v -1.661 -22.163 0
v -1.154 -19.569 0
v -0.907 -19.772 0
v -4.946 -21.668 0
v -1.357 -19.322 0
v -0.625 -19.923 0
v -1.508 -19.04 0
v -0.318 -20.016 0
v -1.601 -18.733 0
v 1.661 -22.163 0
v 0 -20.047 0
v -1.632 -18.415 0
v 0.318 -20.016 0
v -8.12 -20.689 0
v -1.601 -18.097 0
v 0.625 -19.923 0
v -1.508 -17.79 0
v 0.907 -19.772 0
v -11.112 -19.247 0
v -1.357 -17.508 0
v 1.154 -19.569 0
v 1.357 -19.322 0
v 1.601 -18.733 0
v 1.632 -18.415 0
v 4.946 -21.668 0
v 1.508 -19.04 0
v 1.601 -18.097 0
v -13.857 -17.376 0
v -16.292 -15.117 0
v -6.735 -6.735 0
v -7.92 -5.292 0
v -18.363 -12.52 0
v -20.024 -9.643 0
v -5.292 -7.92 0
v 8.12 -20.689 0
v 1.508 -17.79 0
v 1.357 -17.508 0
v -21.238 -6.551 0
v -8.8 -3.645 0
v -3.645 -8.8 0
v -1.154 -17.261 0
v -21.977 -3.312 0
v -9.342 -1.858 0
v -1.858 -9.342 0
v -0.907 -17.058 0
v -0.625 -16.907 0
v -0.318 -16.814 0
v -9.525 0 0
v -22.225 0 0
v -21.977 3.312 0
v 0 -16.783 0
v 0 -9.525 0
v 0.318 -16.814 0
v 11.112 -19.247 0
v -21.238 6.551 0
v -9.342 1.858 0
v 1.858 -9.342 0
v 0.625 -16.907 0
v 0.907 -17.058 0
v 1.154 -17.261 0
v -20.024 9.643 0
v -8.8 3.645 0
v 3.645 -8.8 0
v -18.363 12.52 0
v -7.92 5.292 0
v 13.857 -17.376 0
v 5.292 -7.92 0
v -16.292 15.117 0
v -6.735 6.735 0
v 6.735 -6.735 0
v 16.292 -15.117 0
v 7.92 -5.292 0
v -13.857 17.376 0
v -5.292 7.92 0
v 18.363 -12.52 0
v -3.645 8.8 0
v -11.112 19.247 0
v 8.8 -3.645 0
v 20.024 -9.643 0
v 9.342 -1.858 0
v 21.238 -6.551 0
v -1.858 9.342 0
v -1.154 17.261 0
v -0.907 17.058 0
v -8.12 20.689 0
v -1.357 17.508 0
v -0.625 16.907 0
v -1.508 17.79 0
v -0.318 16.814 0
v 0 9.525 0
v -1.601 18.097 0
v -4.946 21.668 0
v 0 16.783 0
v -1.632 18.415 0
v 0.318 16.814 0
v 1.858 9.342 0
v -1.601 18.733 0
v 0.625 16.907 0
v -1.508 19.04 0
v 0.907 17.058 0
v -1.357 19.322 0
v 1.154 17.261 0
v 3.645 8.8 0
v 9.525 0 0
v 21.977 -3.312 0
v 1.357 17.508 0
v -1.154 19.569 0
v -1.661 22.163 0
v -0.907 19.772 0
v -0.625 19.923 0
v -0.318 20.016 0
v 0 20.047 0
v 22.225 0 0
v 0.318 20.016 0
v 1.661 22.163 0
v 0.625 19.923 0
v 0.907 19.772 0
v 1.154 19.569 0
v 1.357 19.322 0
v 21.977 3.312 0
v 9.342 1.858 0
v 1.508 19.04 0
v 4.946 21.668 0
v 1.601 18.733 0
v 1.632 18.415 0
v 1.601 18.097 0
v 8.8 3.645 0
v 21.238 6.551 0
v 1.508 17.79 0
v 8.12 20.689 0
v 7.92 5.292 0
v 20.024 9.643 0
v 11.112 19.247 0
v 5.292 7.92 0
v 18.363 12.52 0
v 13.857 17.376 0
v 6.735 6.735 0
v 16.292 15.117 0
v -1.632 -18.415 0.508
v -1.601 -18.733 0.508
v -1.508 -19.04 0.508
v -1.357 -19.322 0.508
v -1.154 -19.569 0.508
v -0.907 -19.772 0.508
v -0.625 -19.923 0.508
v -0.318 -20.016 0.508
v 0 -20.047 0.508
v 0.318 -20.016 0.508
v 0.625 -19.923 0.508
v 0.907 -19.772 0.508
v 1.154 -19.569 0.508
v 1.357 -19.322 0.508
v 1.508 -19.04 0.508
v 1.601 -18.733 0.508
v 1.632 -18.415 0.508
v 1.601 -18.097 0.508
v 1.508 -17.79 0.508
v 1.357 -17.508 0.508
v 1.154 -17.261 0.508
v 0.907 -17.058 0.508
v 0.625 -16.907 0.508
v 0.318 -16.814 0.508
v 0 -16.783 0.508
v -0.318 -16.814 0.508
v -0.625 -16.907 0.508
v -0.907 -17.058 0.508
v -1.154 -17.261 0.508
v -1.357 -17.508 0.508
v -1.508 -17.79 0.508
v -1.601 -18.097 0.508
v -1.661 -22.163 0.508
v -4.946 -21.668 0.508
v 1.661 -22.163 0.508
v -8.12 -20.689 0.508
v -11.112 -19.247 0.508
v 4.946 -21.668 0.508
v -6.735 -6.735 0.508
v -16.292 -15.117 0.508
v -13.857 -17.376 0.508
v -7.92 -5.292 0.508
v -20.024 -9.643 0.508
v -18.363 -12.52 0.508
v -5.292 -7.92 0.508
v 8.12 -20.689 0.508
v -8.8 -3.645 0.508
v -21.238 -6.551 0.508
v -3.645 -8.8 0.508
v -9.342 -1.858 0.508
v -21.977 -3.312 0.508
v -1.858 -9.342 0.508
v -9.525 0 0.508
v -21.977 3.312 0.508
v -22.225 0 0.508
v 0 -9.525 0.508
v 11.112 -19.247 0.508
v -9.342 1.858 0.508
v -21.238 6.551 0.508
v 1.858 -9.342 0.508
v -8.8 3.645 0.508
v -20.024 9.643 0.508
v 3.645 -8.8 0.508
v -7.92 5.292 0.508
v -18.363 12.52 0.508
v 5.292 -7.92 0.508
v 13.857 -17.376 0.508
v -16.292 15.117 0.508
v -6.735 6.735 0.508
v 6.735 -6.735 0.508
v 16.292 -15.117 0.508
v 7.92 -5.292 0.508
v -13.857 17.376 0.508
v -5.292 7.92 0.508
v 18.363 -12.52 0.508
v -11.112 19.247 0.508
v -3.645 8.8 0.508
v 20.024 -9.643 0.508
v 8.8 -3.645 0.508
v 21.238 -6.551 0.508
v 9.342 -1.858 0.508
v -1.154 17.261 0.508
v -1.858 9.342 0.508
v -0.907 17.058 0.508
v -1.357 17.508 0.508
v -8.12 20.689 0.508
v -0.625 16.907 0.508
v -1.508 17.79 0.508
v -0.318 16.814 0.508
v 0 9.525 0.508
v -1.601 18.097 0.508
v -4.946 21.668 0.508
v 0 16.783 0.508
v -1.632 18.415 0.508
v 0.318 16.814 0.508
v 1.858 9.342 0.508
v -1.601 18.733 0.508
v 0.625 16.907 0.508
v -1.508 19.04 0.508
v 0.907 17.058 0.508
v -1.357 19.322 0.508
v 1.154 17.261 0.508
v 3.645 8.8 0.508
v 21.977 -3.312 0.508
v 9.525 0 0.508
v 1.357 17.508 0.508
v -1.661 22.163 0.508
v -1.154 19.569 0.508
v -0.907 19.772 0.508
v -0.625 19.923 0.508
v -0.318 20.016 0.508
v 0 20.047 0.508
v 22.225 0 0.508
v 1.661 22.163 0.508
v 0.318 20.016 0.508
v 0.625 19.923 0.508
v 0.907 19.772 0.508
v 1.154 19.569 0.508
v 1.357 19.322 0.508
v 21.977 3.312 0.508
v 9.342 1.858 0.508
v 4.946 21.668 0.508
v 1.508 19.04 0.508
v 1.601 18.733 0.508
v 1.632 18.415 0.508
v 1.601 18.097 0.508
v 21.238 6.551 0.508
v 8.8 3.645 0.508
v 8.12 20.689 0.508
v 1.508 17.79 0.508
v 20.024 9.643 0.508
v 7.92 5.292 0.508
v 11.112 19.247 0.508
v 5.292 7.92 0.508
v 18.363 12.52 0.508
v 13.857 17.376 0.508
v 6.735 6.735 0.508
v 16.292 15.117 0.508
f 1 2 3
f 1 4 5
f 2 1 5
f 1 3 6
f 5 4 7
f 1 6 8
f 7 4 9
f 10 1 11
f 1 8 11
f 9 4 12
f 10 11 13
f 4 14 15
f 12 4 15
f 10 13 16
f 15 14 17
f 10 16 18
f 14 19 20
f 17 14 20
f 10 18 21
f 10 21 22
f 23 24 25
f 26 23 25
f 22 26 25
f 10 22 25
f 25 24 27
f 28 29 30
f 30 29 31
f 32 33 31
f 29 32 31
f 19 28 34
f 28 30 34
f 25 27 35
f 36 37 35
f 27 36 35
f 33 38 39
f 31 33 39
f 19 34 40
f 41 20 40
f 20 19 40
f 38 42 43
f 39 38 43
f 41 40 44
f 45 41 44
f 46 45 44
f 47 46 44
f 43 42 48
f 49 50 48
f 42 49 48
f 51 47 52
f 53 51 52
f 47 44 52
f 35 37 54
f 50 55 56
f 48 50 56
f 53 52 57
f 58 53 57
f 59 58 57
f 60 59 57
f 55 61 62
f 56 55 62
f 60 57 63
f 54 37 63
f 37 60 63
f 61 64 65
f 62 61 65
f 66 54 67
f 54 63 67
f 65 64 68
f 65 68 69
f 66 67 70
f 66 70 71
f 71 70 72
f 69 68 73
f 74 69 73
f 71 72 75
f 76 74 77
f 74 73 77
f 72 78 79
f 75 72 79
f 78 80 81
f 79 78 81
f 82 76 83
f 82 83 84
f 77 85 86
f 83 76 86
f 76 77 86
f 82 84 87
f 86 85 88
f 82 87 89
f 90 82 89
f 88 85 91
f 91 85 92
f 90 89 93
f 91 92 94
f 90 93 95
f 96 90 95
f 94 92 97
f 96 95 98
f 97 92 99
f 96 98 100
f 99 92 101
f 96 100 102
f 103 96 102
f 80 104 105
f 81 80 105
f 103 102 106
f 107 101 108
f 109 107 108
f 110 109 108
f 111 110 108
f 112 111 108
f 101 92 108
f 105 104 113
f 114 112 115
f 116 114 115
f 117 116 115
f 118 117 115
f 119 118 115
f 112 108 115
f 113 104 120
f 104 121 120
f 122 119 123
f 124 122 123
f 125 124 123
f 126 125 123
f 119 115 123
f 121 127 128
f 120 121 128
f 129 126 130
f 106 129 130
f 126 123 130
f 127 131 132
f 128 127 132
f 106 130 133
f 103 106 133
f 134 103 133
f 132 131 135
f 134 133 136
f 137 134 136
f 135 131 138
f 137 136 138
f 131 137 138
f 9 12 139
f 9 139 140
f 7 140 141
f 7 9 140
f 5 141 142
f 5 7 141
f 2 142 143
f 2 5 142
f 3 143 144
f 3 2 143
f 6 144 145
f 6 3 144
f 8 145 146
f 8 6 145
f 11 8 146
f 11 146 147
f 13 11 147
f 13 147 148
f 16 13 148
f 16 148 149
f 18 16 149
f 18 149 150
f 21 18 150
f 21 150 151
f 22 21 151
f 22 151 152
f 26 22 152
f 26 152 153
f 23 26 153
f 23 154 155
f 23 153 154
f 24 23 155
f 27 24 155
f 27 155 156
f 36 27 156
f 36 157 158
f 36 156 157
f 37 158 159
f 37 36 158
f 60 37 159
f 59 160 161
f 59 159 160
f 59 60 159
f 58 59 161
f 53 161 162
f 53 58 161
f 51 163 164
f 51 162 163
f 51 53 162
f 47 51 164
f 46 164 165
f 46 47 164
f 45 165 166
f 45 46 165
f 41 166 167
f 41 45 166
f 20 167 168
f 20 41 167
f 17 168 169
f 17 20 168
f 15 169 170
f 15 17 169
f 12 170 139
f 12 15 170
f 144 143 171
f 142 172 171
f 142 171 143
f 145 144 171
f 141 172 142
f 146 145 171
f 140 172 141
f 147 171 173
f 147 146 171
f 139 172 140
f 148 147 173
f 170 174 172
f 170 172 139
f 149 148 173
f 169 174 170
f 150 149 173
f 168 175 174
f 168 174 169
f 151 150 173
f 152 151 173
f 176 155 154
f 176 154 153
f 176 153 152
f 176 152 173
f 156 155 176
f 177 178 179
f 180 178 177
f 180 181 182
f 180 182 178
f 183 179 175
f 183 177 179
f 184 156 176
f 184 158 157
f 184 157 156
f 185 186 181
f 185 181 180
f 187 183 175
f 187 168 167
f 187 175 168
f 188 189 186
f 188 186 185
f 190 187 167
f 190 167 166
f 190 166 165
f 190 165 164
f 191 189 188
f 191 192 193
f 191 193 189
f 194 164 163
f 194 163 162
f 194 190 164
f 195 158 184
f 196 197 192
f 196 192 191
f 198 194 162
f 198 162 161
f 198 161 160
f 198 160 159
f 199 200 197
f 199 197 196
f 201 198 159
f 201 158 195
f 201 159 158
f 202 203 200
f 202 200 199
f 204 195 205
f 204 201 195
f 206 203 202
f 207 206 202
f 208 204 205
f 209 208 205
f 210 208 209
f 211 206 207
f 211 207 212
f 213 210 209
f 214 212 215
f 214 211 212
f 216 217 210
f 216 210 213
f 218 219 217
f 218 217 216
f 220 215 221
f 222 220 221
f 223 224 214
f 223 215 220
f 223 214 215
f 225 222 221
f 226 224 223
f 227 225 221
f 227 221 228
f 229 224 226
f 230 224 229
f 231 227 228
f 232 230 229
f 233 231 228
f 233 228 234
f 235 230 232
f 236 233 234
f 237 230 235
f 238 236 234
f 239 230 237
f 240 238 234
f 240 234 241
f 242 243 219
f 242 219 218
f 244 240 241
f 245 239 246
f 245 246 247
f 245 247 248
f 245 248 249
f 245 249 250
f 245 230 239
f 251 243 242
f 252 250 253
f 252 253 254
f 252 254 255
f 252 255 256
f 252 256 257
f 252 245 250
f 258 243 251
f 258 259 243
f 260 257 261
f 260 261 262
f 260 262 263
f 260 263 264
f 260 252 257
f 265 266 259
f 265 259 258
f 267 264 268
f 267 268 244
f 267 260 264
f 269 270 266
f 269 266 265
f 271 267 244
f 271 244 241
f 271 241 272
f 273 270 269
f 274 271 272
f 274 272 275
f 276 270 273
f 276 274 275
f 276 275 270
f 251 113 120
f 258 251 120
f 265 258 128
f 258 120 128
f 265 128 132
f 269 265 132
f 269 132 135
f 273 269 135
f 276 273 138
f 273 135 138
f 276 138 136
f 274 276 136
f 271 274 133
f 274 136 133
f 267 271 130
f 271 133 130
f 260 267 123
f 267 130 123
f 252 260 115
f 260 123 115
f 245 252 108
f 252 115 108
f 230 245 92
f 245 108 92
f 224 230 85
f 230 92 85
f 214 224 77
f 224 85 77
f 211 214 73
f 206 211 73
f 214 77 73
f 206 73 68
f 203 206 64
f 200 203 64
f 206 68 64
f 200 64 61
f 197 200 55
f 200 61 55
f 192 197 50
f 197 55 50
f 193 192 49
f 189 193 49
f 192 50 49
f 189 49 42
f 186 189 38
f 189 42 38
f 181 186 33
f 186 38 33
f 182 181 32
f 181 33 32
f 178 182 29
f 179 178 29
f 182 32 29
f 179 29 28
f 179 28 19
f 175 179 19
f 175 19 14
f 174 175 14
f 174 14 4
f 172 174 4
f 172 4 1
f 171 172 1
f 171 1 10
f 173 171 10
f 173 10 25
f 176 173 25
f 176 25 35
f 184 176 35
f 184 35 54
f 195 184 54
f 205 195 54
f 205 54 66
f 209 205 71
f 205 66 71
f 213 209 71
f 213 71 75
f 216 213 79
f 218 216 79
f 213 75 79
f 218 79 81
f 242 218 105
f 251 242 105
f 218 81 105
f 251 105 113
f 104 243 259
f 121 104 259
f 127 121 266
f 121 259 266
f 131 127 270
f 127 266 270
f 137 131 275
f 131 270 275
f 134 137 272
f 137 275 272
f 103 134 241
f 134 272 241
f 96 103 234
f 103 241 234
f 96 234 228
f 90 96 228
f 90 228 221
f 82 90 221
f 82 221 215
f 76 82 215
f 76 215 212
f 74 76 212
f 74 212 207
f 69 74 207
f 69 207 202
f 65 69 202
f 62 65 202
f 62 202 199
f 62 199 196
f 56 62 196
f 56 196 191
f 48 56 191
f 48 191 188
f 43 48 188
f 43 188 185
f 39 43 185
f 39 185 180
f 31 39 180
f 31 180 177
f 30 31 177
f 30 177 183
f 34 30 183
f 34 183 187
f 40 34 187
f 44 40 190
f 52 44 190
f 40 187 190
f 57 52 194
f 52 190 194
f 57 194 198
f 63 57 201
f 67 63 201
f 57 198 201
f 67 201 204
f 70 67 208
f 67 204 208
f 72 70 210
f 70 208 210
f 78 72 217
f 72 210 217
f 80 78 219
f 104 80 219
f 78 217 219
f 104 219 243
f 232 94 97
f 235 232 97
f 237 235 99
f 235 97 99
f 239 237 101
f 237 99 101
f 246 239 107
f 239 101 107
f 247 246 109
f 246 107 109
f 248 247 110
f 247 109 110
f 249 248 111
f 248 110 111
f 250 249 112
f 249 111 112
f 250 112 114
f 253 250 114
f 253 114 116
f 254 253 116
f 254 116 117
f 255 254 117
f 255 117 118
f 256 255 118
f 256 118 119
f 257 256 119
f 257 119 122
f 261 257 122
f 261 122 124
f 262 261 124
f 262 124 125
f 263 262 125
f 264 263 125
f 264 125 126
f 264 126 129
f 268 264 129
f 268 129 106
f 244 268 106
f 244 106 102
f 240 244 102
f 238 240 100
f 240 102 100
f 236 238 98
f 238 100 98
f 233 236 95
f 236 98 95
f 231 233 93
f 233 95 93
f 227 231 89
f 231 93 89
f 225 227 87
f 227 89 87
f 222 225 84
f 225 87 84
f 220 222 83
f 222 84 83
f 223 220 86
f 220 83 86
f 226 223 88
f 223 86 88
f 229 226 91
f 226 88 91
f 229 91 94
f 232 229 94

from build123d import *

# Parameters (mm, degrees)
SKETCH1_R                    = 22.225
BOSS_EXTRUDE1_DEPTH          = 0.508
SKETCH2_R                    = 9.525
CUT_EXTRUDE1_DEPTH           = 1.508
F_30_0_1285_DIAMETER_HOLE1_D = 3.2639


with BuildPart() as part:
    # Sketch1 → Boss-Extrude1 (new body)
    with BuildSketch(Plane.XY):
        Circle(SKETCH1_R)
    extrude(amount=BOSS_EXTRUDE1_DEPTH)

    # Sketch2 → Cut-Extrude1 (cut, through all)
    with BuildSketch(Plane.XY.offset(0.508)):
        Circle(SKETCH2_R)
    extrude(amount=-CUT_EXTRUDE1_DEPTH, mode=Mode.SUBTRACT)

    # #30 (0.1285) Diameter Hole1 (through all)
    with Locations(Plane.XY.offset(0.508)):
        with Locations((0, 18.415)):
            f_30_0_1285_diameter_hole1 = Hole(F_30_0_1285_DIAMETER_HOLE1_D / 2)

    # Mirror1: #30 (0.1285) Diameter Hole1 across plane
    add(f_30_0_1285_diameter_hole1.mirror(Plane.ZX), mode=Mode.SUBTRACT)


solid = part.part
